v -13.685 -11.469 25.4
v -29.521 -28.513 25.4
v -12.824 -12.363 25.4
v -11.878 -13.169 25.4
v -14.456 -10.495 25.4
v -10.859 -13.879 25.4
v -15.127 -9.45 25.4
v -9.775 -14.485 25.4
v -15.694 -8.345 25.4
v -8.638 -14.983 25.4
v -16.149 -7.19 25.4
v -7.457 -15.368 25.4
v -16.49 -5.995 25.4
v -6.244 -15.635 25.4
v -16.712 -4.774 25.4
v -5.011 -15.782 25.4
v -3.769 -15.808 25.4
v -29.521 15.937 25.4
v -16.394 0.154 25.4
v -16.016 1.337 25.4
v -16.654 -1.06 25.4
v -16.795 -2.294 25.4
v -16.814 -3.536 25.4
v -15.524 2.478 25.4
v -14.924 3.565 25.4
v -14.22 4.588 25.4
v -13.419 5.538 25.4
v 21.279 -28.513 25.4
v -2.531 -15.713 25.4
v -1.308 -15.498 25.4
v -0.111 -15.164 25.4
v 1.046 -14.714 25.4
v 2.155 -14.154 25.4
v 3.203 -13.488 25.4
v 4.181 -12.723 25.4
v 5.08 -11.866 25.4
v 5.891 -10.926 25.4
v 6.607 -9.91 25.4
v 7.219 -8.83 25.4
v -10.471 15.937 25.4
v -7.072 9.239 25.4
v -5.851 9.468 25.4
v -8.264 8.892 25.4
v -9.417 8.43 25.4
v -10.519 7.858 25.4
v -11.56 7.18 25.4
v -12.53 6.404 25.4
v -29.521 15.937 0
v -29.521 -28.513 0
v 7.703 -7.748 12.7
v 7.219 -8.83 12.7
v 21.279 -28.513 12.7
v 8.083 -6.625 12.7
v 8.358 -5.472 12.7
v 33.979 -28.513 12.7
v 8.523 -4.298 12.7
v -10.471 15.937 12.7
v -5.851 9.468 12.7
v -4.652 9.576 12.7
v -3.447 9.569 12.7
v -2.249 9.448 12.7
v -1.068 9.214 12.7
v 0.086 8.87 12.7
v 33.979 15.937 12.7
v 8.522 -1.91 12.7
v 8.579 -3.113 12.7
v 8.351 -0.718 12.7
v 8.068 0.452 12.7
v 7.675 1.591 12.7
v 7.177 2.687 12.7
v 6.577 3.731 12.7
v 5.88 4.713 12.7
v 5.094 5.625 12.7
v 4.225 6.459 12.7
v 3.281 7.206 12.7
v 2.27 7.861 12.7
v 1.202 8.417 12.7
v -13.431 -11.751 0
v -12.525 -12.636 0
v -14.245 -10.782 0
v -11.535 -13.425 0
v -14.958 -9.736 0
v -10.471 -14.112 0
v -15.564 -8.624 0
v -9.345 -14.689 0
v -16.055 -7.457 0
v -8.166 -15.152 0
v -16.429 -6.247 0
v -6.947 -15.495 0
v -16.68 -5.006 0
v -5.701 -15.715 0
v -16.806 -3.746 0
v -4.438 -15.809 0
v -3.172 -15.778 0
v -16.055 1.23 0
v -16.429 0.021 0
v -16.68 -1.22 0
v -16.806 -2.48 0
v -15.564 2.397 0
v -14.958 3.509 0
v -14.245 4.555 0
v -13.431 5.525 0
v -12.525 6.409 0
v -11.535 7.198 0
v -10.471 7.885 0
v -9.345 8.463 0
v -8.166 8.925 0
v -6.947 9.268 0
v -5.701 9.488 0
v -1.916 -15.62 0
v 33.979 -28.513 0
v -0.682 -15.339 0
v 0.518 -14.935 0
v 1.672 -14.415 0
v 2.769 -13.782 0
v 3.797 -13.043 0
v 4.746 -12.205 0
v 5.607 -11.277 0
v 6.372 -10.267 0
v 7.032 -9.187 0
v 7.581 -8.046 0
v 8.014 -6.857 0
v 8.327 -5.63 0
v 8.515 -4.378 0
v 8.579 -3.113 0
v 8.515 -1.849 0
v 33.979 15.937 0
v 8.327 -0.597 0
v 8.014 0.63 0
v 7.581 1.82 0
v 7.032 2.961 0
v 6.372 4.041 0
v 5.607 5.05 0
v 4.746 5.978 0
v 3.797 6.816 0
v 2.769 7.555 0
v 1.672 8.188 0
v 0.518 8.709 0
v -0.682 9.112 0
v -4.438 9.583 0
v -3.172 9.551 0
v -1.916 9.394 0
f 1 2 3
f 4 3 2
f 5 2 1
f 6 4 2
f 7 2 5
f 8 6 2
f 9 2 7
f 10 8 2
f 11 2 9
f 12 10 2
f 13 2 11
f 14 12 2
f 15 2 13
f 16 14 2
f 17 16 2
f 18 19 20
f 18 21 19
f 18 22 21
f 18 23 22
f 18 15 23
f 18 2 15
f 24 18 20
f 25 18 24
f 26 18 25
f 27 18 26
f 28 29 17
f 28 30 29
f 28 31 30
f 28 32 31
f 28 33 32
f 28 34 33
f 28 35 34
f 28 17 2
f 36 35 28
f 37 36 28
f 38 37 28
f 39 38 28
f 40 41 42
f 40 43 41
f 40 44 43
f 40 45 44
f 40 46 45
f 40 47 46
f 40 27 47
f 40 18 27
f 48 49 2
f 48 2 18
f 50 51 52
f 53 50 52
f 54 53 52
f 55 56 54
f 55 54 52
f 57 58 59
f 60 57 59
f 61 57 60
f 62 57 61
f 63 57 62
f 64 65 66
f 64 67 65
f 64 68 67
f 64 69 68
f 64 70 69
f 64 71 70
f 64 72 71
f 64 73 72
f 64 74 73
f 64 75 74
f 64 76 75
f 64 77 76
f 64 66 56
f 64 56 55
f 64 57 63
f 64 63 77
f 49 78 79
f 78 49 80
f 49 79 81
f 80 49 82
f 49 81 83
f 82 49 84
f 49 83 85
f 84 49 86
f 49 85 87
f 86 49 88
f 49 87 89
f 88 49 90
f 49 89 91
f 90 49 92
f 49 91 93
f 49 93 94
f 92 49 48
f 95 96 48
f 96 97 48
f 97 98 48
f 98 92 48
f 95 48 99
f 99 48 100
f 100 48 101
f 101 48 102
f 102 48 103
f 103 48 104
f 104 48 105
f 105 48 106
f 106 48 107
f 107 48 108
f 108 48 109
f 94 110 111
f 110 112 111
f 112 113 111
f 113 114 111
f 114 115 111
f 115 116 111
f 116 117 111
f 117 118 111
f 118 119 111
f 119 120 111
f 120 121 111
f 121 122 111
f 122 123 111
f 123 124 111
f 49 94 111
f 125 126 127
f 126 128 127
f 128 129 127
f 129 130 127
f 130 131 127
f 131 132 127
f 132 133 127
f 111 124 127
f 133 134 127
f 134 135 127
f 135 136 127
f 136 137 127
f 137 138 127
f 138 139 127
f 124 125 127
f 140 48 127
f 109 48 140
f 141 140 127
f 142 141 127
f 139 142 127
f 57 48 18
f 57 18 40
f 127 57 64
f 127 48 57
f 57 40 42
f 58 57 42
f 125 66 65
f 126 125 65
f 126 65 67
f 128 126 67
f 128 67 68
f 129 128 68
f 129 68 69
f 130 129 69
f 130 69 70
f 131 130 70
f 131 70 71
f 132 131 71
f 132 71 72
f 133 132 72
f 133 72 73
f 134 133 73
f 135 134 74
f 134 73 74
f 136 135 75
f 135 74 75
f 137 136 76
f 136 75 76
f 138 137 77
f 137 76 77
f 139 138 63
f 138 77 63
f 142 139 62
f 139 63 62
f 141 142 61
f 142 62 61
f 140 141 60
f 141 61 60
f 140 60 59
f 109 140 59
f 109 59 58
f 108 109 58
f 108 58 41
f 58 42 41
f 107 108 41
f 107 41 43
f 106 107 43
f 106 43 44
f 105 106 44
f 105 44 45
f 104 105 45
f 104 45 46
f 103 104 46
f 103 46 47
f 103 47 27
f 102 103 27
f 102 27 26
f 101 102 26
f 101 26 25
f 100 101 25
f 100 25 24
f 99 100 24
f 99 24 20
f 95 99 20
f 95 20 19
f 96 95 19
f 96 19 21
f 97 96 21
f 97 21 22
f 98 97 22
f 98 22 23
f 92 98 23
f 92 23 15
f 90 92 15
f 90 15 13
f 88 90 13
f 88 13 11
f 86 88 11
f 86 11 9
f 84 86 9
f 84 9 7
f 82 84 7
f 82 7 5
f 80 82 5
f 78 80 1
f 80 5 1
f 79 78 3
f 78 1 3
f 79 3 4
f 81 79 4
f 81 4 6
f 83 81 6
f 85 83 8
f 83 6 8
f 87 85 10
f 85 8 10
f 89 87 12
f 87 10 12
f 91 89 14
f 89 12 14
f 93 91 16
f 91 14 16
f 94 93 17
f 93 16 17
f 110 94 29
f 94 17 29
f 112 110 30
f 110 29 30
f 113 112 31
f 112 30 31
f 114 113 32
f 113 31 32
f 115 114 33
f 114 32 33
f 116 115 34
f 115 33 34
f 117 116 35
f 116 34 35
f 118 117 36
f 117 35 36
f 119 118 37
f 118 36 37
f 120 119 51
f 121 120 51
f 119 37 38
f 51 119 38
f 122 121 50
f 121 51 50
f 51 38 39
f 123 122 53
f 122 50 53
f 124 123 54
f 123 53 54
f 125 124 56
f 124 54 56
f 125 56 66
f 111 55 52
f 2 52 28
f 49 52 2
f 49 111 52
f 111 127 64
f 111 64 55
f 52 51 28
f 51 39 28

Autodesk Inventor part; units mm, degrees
ref_plane "YZ Plane" through (0, 0, 0) normal (1, 0, 0) x (0, 1, 0)
ref_plane "XZ Plane" through (0, 0, 0) normal (0, 1, 0) x (-1, 0, 0)
ref_plane "XY Plane" through (0, 0, 0) normal (0, 0, 1) x (1, 0, 0)
sketch "Sketch1" plane through (0, 0, 0) normal (0, 0, 1) x (1, 0, 0)
  line L0 (-29.5214, 15.9367) -> (33.9786, 15.9367)
  line L1 (33.9786, 15.9367) -> (33.9786, -28.5133)
  line L2 (33.9786, -28.5133) -> (-29.5214, -28.5133)
  line L3 (-29.5214, -28.5133) -> (-29.5214, 15.9367)
  point P0 (0, 0)
  dimension "d0" = 63.5
  dimension "d1" = 44.45
extrude "Extrusion1" add sketch "Sketch1" along normal blind 25.4
sketch "Sketch2" plane through (0, 0, 25.4) normal (0, 0, 1) x (1, 0, 0)
  line L0 (33.9786, 15.9367) -> (-29.5214, 15.9367) projected
  line L1 (-29.5214, -28.5133) -> (33.9786, -28.5133) projected
  line L2 (-10.4714, 15.9367) -> (33.9786, 15.9367)
  line L3 (33.9786, 15.9367) -> (33.9786, -28.5133)
  line L4 (-10.4714, 15.9367) -> (21.2786, -28.5133)
  point P0 (0, 0)
  dimension "d4" = 19.05
  dimension "d12" = 12.7
extrude "Extrusion2" cut sketch "Sketch2" against normal blind 12.7
sketch "Sketch3" plane through (0, 0, 25.4) normal (0, 0, 1) x (1, 0, 0)
  line L0 (33.9786, -28.5133) -> (-29.5214, -28.5133) projected
  line L1 (33.9786, -28.5133) -> (8.5786, -28.5133)
  circle A0 centre (-4.1214, -3.1133) radius 12.7
  line L2 (-29.5214, 15.9367) -> (-29.5214, -28.5133) projected
  point P0 (0, 0)
  dimension "d14" = 25.4
  dimension "d15" = 25.4
  dimension "d16" = 25.4
extrude "Extrusion3" cut sketch "Sketch3" against normal blind 25.4
